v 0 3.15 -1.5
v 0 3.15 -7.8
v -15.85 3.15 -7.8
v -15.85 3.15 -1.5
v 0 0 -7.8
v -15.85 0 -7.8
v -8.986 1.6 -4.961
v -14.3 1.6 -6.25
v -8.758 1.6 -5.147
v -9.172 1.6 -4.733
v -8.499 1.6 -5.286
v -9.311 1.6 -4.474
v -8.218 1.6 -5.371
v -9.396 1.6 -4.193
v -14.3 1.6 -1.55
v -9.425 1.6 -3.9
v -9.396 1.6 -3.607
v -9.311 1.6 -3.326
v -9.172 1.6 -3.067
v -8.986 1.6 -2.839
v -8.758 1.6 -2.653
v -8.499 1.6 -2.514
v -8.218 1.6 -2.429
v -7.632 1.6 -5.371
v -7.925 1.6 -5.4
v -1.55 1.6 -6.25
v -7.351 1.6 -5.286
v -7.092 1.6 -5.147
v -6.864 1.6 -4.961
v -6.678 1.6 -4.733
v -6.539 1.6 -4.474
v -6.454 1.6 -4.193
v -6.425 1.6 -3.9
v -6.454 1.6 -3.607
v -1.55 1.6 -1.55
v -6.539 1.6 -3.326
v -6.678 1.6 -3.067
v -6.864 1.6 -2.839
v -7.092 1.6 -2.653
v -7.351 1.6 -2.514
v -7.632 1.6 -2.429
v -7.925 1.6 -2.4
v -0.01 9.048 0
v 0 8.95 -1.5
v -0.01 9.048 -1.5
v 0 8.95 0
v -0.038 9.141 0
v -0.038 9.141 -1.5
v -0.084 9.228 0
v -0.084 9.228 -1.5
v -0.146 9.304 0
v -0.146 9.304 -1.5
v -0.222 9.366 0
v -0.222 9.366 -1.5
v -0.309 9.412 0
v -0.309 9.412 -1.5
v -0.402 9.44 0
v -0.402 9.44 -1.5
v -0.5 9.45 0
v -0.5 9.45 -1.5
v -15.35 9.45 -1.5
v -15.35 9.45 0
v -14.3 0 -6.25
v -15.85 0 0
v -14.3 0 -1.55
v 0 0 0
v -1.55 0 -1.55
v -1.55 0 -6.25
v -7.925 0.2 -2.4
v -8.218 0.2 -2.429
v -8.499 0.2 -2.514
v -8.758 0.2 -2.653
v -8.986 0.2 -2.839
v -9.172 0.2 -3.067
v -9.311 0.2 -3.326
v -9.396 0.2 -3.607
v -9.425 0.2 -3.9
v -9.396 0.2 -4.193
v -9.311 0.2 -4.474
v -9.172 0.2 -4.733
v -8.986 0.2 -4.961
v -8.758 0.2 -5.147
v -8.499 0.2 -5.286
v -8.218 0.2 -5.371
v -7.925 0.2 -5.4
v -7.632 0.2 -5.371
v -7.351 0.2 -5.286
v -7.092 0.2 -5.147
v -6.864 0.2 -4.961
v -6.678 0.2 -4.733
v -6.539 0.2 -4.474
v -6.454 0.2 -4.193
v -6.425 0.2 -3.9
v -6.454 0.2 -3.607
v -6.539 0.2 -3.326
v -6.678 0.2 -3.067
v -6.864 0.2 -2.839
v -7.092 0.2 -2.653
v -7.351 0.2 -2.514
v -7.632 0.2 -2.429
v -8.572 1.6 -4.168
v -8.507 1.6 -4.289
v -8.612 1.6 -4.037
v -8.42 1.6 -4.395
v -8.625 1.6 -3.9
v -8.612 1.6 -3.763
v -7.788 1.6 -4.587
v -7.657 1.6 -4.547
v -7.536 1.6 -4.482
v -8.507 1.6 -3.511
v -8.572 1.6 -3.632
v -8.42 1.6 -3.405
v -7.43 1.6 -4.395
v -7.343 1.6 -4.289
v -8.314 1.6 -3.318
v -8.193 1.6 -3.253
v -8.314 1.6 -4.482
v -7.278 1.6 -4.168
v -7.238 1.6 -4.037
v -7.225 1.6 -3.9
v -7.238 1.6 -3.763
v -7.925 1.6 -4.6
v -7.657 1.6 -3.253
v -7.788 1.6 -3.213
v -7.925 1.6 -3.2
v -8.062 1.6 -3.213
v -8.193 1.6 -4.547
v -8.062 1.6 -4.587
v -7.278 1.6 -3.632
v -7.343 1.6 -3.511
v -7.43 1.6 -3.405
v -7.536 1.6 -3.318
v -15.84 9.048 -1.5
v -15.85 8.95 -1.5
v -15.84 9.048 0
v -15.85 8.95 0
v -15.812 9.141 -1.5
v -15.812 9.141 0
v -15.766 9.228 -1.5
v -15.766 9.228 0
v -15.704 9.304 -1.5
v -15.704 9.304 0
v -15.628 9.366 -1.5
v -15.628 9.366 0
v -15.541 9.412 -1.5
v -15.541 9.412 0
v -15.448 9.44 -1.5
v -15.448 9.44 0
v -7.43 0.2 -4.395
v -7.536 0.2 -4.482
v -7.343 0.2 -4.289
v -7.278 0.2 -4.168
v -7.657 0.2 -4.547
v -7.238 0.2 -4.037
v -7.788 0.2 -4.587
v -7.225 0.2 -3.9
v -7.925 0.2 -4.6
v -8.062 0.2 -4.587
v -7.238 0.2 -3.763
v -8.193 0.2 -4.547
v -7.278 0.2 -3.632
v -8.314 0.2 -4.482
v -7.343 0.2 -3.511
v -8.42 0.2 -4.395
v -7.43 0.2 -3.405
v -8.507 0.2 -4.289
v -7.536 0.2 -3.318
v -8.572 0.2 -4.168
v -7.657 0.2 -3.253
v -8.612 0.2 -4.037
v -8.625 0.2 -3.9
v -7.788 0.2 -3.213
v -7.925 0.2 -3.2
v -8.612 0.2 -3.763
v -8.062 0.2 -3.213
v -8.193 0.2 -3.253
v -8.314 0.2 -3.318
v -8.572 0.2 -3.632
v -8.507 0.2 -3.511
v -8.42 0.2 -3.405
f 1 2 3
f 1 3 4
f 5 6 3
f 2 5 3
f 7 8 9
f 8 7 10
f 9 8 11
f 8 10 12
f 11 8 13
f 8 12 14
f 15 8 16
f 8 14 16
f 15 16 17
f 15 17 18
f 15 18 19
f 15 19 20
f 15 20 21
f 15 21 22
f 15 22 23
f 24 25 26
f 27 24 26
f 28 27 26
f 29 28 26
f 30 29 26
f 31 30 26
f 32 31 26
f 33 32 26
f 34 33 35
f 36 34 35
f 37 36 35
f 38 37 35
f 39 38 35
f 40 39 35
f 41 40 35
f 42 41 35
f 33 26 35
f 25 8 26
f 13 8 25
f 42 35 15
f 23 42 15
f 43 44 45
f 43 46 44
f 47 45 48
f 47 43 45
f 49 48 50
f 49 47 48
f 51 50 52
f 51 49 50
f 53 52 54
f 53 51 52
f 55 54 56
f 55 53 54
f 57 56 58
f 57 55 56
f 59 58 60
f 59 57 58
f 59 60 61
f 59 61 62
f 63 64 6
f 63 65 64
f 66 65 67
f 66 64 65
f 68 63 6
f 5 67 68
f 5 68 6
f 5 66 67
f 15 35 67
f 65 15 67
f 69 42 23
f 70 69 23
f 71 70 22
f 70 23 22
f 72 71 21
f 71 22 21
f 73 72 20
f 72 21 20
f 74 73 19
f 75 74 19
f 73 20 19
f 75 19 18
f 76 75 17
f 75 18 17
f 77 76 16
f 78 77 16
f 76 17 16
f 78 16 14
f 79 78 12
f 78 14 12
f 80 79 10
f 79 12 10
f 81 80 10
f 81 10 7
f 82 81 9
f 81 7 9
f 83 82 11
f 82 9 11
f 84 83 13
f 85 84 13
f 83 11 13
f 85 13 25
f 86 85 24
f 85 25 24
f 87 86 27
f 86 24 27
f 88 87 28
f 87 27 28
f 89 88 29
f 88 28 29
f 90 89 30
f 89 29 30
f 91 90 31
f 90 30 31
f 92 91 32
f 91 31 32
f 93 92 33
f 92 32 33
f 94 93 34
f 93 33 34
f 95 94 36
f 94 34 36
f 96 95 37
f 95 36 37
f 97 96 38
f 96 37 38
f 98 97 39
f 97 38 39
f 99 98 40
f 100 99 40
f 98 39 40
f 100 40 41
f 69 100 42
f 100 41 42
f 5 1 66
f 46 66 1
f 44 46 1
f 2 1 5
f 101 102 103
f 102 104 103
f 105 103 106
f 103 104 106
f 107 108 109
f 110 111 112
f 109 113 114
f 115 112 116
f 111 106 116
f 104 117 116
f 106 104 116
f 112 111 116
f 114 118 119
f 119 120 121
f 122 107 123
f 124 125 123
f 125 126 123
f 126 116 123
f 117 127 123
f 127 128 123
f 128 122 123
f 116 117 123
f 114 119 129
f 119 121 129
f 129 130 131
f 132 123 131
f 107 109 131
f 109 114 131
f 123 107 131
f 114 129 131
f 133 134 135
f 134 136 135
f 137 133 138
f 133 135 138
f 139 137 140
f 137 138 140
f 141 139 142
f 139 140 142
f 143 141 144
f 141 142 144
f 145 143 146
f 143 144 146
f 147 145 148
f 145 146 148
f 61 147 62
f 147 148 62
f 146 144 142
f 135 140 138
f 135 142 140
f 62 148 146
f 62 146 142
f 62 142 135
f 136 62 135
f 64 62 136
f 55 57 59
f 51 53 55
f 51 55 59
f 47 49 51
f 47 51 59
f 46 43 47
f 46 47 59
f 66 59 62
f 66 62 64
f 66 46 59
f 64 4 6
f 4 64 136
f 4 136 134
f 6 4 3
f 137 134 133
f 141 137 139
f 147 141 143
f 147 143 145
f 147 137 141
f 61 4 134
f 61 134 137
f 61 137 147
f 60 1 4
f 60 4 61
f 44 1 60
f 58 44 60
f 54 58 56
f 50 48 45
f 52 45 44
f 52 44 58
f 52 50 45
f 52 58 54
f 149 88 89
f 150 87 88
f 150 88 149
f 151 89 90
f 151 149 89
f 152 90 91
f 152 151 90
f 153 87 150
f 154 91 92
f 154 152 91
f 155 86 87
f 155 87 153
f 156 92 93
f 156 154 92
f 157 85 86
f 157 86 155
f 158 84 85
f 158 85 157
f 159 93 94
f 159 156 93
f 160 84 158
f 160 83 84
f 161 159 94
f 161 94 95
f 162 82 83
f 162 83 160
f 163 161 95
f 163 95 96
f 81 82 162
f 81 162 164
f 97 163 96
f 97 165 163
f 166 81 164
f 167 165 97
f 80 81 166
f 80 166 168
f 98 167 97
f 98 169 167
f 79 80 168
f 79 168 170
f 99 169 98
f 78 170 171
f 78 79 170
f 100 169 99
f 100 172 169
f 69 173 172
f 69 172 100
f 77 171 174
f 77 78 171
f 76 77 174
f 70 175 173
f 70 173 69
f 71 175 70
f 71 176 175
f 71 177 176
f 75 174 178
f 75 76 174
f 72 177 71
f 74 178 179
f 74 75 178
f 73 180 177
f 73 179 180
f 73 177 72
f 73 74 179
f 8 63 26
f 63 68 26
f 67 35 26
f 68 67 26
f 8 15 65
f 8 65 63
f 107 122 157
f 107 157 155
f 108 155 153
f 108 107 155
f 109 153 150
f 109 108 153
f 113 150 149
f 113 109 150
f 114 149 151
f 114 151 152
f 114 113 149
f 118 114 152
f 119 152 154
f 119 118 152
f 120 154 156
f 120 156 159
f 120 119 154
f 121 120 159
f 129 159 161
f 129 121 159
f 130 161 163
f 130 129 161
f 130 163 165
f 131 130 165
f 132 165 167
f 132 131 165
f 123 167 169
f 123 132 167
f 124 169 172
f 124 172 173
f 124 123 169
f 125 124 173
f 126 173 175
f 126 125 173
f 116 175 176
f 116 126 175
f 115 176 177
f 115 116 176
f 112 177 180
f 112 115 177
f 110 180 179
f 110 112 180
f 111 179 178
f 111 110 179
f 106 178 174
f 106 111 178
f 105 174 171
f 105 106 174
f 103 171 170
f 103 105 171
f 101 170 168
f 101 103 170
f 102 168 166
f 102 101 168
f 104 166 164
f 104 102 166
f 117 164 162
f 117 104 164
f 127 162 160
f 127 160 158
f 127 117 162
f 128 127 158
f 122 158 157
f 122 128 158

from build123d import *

# Parameters (mm, degrees)
BOSS_EXTRUDE1_DEPTH = 15.85
SHELL1_T            = -1.55
SKETCH2_R           = 1.5
SKETCH2_R_2         = 0.7
BOSS_EXTRUDE2_DEPTH = 1.4
FILLET1_R           = 0.5


with BuildPart() as part:
    # Sketch1 → Boss-Extrude1 (new body)
    with BuildSketch(Plane(origin=(0, 0, 0), x_dir=(0, 0, -1), z_dir=(1, 0, 0))):
        Polygon((0, 0), (7.8, 0), (7.8, 3.15), (1.5, 3.15), (1.5, 9.45), (0, 9.45), align=None)
    extrude(amount=-BOSS_EXTRUDE1_DEPTH)

    # Shell1
    shell1_openings = [part.faces().sort_by_distance(p)[0] for p in [
        (-7.925, 0, -3.9),
    ]]
    offset(amount=SHELL1_T, openings=shell1_openings, kind=Kind.INTERSECTION)

    # Sketch2 → Boss-Extrude2 (add)
    with BuildSketch(Plane.XZ.offset(-1.6)):
        with Locations(Location((-7.925, -3.9, 0), (0, 0, 90))):
            Circle(SKETCH2_R)
        with Locations(Location((-7.925, -3.9, 0), (0, 0, 270))):
            Circle(SKETCH2_R_2, mode=Mode.SUBTRACT)
    extrude(amount=BOSS_EXTRUDE2_DEPTH)

    # Fillet1
    fillet1_edges = [part.edges().sort_by_distance(p)[0] for p in [
        (-15.85, 9.45, -0.75),
        (0, 9.45, -0.75),
    ]]
    fillet(fillet1_edges, radius=FILLET1_R)


solid = part.part
